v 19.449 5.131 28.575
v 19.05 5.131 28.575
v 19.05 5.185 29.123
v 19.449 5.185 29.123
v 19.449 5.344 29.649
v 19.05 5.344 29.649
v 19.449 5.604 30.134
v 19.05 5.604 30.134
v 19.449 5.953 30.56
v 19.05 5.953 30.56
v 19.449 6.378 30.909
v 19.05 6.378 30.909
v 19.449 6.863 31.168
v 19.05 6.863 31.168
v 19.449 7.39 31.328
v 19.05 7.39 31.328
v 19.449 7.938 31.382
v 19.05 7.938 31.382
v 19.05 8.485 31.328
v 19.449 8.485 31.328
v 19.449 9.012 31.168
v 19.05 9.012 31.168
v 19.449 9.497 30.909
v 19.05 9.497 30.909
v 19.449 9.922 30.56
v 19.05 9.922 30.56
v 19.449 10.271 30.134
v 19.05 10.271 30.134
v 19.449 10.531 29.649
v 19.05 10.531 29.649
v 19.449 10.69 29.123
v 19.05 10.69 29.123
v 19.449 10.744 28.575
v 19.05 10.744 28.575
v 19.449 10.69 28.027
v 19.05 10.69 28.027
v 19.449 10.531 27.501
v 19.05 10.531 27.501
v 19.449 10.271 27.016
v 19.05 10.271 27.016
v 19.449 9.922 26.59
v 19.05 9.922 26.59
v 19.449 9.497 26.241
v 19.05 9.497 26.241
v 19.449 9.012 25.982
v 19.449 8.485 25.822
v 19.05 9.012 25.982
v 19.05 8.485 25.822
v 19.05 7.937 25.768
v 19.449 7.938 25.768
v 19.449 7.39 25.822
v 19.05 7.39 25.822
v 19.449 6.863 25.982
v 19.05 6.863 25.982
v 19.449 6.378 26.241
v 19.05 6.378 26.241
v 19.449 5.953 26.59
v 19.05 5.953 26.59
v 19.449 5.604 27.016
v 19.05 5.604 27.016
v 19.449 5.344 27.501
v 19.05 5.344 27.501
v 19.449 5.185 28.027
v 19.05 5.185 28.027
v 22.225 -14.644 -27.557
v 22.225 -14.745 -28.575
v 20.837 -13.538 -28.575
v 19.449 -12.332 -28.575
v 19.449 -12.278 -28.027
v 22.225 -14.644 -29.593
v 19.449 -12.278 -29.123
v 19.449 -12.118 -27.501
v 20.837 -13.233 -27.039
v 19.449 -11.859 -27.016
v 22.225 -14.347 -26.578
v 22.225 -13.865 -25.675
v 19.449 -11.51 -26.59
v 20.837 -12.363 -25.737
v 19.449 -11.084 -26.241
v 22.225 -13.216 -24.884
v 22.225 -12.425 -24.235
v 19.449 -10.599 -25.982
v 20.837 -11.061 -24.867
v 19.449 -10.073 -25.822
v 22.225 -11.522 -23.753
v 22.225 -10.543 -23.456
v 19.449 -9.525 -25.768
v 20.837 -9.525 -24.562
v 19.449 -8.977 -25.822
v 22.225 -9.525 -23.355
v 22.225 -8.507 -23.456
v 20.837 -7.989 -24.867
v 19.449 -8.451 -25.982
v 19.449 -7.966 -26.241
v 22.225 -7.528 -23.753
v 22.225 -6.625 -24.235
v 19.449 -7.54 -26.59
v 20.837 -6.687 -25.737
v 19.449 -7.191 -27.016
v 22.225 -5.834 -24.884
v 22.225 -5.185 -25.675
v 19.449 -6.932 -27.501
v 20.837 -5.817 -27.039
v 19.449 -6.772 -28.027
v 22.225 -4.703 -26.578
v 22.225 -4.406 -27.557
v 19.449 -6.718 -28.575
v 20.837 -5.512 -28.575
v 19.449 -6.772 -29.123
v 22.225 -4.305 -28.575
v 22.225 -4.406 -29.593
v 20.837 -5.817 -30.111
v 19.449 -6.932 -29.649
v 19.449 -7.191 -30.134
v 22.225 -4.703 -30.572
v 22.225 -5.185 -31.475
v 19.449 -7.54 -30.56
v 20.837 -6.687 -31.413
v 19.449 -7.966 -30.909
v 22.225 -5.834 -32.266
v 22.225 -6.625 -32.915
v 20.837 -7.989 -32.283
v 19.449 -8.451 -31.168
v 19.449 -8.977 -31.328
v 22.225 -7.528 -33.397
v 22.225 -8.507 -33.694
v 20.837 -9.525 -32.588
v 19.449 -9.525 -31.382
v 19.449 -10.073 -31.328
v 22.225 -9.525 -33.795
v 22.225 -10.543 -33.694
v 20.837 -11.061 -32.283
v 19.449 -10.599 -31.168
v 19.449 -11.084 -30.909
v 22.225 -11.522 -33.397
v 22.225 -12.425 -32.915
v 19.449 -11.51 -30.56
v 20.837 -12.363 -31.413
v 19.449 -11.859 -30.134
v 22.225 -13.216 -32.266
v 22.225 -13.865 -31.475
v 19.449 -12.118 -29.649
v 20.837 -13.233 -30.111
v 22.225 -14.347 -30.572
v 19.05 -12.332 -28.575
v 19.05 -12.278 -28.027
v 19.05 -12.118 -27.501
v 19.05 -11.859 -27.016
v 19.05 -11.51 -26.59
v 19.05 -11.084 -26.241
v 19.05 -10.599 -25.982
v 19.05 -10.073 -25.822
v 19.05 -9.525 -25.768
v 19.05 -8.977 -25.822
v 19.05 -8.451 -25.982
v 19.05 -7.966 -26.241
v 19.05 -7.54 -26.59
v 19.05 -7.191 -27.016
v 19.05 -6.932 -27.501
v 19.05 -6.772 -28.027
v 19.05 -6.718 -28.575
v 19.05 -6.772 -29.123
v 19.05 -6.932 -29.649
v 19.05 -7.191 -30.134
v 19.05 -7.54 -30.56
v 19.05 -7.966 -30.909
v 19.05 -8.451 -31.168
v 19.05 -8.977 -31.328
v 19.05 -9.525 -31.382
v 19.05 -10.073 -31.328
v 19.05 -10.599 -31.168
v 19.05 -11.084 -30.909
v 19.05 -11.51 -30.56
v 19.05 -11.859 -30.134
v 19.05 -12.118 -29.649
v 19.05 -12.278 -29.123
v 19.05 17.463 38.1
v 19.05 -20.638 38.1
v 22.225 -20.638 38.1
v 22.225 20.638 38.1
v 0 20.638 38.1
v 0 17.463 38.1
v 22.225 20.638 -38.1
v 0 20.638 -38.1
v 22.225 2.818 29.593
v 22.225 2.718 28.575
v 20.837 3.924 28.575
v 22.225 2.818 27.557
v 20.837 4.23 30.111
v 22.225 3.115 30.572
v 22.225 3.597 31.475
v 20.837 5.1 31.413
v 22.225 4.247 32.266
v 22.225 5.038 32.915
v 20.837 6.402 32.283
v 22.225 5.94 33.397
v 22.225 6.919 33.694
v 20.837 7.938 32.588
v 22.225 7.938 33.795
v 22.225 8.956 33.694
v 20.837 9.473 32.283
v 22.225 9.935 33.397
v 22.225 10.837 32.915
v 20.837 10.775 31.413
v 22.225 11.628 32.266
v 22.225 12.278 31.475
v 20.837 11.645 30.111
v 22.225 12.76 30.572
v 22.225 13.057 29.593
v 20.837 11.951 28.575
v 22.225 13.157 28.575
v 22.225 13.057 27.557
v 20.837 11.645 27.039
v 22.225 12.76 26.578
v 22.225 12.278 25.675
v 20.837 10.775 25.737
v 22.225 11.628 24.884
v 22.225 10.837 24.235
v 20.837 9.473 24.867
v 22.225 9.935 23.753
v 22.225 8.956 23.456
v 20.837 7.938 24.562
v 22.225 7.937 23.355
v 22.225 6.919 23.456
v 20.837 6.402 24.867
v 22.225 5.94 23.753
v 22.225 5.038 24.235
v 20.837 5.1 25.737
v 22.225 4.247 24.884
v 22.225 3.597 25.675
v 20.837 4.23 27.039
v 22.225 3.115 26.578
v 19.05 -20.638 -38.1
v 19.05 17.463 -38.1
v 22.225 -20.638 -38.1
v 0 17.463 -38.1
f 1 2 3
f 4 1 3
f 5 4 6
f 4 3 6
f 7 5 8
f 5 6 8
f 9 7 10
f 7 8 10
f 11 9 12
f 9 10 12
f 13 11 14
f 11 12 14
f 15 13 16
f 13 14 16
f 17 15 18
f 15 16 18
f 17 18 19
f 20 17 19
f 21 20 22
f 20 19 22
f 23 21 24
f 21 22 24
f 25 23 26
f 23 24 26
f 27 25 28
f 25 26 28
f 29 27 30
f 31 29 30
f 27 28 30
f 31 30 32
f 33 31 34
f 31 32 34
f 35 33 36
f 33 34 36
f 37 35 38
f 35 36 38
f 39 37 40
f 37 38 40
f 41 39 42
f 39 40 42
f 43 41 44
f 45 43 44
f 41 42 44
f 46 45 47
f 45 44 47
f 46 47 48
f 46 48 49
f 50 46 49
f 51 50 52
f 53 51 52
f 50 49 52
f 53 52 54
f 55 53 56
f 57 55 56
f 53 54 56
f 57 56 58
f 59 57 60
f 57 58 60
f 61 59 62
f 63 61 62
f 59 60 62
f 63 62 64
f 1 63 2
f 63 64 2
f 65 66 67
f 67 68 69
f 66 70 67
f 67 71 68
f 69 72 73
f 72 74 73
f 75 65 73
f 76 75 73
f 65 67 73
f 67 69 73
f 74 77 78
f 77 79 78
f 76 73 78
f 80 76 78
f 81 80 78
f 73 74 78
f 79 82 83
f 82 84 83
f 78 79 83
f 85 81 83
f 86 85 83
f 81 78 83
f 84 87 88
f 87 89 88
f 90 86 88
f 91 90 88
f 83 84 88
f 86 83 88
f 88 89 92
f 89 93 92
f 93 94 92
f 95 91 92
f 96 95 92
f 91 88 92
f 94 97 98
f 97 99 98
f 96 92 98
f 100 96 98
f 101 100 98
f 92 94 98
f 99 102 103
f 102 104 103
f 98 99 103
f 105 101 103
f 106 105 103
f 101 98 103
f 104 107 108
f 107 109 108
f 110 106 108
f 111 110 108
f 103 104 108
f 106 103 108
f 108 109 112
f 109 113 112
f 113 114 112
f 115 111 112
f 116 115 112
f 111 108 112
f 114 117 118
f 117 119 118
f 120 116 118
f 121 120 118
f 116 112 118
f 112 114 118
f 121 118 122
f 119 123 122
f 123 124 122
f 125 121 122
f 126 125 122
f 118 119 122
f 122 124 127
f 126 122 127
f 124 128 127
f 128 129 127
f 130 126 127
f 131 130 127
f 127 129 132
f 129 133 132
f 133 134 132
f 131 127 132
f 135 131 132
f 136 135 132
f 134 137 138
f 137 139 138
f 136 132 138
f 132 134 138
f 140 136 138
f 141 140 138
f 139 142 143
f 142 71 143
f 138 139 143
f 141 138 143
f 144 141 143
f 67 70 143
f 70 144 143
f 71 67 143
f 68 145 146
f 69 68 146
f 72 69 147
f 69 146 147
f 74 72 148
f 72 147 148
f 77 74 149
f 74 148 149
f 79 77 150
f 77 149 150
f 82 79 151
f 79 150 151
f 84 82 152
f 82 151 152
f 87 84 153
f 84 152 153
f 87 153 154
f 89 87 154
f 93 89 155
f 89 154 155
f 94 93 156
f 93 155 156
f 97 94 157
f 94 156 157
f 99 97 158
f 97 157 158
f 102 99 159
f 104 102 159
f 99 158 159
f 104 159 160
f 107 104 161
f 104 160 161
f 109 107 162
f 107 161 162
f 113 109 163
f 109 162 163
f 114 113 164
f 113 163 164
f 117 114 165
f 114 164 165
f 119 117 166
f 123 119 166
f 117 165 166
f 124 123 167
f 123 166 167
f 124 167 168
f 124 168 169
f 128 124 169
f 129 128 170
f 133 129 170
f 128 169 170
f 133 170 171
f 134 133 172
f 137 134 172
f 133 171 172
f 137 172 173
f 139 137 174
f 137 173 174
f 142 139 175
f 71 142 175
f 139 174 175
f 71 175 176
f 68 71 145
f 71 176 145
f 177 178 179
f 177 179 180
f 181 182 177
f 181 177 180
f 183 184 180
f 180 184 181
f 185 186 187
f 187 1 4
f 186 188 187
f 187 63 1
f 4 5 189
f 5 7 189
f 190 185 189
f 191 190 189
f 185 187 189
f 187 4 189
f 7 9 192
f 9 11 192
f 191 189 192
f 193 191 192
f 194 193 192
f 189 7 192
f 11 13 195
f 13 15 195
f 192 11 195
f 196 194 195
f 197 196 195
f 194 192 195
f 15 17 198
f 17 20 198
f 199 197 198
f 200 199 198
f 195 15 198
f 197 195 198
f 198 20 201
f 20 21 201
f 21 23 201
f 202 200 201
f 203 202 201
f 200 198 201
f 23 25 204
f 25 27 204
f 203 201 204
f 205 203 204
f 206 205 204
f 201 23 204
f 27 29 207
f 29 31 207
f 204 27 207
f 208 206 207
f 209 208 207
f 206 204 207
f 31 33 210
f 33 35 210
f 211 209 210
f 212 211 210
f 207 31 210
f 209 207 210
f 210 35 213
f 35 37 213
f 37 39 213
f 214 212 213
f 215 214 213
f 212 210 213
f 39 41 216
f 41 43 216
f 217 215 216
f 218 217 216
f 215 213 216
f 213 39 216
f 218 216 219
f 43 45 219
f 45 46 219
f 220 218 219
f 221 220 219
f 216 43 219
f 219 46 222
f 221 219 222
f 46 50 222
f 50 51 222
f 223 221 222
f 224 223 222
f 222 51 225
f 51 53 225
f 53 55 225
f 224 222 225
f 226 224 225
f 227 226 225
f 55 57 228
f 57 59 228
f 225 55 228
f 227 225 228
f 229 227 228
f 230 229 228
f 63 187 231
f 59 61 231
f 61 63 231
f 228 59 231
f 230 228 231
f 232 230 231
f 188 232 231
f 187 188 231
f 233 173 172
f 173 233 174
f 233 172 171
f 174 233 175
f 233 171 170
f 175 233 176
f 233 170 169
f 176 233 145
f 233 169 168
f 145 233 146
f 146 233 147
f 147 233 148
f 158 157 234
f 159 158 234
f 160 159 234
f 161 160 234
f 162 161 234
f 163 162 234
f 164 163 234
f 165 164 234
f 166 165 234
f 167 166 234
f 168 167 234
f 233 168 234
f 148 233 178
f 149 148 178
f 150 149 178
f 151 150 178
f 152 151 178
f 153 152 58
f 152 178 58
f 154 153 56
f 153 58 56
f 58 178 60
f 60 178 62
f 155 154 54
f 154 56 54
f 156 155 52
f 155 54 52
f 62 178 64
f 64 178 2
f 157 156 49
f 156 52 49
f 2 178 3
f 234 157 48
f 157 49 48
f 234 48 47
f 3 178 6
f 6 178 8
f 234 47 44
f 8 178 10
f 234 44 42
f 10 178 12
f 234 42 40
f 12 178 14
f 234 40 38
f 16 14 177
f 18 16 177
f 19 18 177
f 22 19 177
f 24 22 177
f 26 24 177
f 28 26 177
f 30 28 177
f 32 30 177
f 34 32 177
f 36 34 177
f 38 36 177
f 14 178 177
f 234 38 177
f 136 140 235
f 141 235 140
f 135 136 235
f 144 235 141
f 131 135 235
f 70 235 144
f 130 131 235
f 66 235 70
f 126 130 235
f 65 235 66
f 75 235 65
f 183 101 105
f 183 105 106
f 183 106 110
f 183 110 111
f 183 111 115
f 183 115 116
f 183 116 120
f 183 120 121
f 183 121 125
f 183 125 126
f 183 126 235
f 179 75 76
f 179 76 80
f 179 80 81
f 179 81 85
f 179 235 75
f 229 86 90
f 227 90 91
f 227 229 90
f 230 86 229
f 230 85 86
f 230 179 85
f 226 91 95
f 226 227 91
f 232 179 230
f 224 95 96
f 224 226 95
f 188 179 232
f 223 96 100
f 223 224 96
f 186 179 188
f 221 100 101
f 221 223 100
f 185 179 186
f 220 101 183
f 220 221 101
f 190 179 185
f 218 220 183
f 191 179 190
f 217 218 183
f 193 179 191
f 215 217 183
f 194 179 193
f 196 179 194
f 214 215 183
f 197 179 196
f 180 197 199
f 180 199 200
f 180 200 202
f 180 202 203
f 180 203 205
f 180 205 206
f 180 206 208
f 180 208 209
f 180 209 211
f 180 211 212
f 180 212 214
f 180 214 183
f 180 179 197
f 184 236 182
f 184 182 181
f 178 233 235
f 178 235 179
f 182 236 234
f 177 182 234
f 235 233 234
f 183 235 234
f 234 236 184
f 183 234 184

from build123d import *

# Parameters (mm, degrees)
F0_W           = 41.275
F0_H           = 76.2
F1_DEPTH       = 22.225
F3_D           = 5.6134
F3_CSINK_D     = 10.4394
F3_CSINK_ANGLE = 82
F4_W           = 19.05
F4_H           = 38.1
F5_DEPTH       = 76.201


# Not quite as in the source:
# - a feature names something its author has since deleted; it is built from what else it names


with BuildPart() as f1:
    # F0 (on Right) → F1 (new body)
    with BuildSketch(Plane.YZ):
        Rectangle(F0_W, F0_H)
    extrude(amount=F1_DEPTH)

    # F3 (through all)
    with Locations(Plane.YZ.offset(22.225)):
        with Locations((7.9375, 28.575), (-9.525, -28.575)):
            CounterSinkHole(F3_D / 2, F3_CSINK_D / 2, counter_sink_angle=F3_CSINK_ANGLE)

    # F4 (on face) → F5 (cut, through all)
    with BuildSketch(Plane.XY.offset(38.1)):
        with Locations((9.525, -1.5875)):
            Rectangle(F4_W, F4_H)
    extrude(amount=-F5_DEPTH, mode=Mode.SUBTRACT)


solid = f1.part
